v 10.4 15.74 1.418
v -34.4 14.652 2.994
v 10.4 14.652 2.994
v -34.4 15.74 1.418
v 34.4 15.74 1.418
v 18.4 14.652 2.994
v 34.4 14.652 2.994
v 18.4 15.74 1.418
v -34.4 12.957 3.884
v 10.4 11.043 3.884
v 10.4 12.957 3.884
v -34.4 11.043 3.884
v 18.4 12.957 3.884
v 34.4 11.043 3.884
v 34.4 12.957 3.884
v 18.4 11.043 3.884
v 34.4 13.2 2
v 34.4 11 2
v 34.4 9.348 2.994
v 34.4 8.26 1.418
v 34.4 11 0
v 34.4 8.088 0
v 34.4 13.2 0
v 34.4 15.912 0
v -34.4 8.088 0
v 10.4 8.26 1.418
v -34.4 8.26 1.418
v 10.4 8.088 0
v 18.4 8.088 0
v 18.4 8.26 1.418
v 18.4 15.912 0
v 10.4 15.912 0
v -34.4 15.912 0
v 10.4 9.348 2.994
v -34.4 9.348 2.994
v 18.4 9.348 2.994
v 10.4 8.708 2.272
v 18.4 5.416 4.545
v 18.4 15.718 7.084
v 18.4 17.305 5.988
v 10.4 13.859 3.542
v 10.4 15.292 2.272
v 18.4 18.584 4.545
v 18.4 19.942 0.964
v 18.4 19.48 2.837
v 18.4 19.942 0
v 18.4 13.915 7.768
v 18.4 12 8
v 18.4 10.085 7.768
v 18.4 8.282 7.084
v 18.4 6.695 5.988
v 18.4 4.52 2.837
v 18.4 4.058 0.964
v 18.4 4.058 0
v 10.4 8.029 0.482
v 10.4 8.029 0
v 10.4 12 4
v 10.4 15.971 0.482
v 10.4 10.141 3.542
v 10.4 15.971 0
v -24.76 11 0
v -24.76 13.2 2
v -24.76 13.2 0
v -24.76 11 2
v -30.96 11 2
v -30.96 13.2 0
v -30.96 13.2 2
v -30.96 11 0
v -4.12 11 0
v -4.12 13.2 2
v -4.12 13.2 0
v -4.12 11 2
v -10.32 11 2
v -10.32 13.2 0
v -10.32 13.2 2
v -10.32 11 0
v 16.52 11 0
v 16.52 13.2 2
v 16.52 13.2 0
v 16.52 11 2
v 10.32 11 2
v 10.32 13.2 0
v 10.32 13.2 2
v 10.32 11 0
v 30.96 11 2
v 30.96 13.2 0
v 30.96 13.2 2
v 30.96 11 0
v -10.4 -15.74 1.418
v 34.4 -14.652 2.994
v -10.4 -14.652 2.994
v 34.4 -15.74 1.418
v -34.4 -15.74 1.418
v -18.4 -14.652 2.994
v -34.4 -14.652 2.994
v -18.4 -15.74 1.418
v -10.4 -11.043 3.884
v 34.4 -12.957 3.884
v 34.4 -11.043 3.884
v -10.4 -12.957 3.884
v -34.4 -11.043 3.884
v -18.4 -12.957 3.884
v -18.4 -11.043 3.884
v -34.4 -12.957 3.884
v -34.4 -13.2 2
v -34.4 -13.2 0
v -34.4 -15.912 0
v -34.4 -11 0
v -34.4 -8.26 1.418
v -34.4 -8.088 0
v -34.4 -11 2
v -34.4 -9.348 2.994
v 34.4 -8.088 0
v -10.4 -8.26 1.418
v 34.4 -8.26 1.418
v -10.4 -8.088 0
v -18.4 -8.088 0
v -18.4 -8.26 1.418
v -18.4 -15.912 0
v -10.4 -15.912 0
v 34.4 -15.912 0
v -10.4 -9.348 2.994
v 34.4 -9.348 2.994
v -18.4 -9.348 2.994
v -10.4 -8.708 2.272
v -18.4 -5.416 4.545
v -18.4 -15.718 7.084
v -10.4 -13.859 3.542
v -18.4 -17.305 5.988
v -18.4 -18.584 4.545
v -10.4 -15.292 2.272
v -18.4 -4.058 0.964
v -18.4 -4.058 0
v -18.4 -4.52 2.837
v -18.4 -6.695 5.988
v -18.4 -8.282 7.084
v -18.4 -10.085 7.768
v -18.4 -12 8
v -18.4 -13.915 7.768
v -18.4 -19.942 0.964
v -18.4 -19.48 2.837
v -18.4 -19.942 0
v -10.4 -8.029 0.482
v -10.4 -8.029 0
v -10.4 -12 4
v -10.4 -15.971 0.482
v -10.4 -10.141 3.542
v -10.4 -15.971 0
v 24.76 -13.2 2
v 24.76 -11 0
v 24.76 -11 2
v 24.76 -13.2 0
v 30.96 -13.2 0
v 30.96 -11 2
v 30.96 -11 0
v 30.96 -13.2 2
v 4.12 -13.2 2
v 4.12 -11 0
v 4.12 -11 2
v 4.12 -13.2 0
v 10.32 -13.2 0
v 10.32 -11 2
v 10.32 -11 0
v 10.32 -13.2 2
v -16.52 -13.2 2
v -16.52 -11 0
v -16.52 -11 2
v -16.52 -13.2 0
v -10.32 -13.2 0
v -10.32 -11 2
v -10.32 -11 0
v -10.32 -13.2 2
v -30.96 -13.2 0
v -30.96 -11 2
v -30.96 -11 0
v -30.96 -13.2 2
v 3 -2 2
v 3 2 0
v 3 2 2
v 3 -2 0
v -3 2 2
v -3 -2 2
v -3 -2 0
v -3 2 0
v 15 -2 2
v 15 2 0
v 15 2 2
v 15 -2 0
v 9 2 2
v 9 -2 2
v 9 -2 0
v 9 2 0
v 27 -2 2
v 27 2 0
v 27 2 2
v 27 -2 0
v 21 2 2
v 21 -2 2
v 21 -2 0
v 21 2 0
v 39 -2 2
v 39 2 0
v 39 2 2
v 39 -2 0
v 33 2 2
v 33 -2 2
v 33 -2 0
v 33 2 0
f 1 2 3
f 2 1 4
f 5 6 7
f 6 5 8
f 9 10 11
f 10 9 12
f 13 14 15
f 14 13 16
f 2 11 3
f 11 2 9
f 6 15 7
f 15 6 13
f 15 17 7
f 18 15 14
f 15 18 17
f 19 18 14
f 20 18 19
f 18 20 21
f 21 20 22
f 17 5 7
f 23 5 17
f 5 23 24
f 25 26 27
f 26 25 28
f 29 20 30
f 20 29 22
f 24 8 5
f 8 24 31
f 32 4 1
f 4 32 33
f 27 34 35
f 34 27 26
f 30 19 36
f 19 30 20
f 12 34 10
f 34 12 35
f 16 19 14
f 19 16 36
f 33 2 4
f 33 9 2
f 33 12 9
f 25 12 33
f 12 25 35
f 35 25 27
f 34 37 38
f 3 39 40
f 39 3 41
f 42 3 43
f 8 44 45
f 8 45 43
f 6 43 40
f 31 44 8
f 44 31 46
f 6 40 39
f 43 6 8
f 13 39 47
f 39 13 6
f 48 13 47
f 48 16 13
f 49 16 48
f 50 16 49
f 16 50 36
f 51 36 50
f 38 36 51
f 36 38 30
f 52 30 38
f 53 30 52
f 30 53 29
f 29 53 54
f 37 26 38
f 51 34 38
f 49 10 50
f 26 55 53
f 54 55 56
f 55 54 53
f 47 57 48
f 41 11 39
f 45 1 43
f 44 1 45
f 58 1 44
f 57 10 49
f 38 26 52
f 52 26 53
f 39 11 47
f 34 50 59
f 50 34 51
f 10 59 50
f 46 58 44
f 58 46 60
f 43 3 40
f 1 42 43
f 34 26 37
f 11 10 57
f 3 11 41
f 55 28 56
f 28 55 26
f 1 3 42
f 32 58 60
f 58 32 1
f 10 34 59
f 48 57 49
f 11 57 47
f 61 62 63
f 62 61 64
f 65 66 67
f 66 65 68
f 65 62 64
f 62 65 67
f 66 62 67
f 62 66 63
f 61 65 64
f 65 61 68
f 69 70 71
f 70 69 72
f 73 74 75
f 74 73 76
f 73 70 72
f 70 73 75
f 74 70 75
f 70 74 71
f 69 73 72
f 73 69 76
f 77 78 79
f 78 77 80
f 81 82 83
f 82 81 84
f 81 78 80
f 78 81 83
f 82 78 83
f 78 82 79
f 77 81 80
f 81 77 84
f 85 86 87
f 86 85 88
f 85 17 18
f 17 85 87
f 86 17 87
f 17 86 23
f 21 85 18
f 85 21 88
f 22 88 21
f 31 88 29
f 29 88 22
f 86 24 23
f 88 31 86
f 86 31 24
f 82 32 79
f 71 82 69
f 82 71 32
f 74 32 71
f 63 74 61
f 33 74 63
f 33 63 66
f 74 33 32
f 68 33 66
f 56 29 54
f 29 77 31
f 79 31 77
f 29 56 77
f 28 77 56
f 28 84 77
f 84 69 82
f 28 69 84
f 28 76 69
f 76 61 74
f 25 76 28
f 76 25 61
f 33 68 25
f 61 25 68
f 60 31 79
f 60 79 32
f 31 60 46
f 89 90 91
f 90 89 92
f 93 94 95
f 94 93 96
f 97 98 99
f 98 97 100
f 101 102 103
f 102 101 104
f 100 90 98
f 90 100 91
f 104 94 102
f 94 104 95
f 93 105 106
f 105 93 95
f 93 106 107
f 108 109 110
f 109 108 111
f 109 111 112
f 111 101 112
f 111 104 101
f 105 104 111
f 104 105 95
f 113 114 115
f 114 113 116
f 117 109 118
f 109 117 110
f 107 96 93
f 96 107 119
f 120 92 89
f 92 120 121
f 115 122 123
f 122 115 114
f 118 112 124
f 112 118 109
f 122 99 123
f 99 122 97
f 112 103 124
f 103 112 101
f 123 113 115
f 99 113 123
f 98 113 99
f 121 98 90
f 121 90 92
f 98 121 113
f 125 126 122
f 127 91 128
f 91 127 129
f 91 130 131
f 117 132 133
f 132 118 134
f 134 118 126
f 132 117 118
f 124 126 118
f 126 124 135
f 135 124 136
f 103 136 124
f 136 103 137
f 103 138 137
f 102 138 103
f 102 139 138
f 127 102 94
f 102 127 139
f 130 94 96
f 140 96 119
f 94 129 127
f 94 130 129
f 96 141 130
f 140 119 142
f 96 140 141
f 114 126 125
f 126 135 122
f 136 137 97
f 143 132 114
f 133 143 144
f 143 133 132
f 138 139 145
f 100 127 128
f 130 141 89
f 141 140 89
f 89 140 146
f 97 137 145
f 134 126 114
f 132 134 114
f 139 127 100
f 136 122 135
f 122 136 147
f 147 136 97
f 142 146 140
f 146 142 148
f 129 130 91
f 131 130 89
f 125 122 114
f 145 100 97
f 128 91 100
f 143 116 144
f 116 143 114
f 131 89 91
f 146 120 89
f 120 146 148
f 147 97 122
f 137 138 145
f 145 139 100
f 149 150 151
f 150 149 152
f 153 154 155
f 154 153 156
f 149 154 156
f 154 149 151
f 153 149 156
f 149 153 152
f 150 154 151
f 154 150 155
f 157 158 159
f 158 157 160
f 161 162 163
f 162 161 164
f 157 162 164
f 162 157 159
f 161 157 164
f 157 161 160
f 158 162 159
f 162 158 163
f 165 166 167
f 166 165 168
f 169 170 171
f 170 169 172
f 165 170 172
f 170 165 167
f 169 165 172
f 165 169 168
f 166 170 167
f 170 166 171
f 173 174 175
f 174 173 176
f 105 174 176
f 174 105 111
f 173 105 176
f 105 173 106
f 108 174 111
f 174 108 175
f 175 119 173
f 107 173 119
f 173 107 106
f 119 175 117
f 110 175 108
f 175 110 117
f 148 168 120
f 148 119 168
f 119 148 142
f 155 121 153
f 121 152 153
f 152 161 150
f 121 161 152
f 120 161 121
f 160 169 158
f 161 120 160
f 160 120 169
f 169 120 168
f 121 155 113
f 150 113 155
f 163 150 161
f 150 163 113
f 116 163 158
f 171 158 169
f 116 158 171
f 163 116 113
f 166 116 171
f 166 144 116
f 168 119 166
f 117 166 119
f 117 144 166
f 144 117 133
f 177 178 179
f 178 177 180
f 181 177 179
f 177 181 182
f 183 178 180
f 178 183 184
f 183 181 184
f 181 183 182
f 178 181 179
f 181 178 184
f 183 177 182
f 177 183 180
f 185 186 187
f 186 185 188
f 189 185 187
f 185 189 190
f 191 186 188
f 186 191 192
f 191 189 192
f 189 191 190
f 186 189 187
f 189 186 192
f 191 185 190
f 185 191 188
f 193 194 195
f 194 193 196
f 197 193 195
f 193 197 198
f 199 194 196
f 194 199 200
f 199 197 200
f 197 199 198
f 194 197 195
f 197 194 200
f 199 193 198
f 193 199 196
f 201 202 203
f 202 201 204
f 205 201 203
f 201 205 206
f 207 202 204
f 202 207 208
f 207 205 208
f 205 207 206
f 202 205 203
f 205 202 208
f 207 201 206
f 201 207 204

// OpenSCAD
// file: config.scad
// ----------------------------------------------------------------------------
// Configuration of the carousel and its components.
//
// All the values beyod "---- derived" string in each of the sections should
// not be modified manually, as they are derived from the previously defined
// parameters in some way...
// ----------------------------------------------------------------------------

// Generic parameters to address consistency & interconnections of parts.
CYL_FN = 32; // BEWARE!!! set to +- 256 for STL export!
BLEED = 0.5; // overlap for union & difference operations
EASE = 0.2; // socket/pin ease for interconnecting of parts & holes

// Core defining shape of our carousel is N-faced cylinder.
// This affects most of the subsequent parameter definitions & usage.
CAROUSEL_FACE_COUNT = 6;
CAROUSEL_ESCRIBED_RADIUS = 120;
// ---- derived
CAROUSEL_INSCRIBED_RADIUS = CAROUSEL_ESCRIBED_RADIUS * cos(180/CAROUSEL_FACE_COUNT);

// Base of the carousel -> stand that holds the axle, walls, etc.
BASE_TOTAL_HEIGHT = 24;
BASE_FLOOR_THICKNESS = 4;
BASE_WALL_THICKNESS = 4;

// Face, or, a wall of the carousel "shell".
FACE_HEIGHT = 150;
FACE_THICKNESS = 5;
// ---- derived
FACE_WIDTH = CAROUSEL_ESCRIBED_RADIUS * 2 * sin(180/CAROUSEL_FACE_COUNT);
FACE_ANGLE = (1 - 2/CAROUSEL_FACE_COUNT)*180;
FACE_APOTHEM_LEN = FACE_WIDTH / (2 * tan(180/CAROUSEL_FACE_COUNT));
FACE_DOOR_HEIGHT = 0.66 * FACE_HEIGHT;
FACE_DOOR_WIDTH = 0.75 * FACE_WIDTH;

// Roof of the carousel.
ROOF_THICKNESS = 1;
ROOF_HEIGHT = 0.3 * FACE_HEIGHT;

// Ball bearing - real-life dimensions of ball bearing used to "power" the axle.
BEARING_OUTER_D = 22;
BEARING_INNER_D = 8;
BEARING_HEIGHT = 7;
BEARING_SHELL_THICKNESS = 2;

// Axle rotating inside carousel.
AXLE_RADIUS = 4;

// Rotating rig carrying the seats.
RIG_HEIGHT = 6;
RIG_STR = 6;

// Abstract "rings" carrying seats, and their distance off the carousel center
// as a fraction of radius.
RIG_RING_POSITIONS = [0.3, 0.6, 0.9];
RIG_MAX_R = 0.90 * CAROUSEL_INSCRIBED_RADIUS;

COLOR_WALL = "BurlyWood";
COLOR_STRUTS = "SaddleBrown";
COLOR_BASE = "DarkGray";
COLOR_ROOF = "DarkSeaGreen";
COLOR_AXLE = "SaddleBrown";
// main file
include <config.scad>;

arm_height = 2 * AXLE_RADIUS;
axle_height = ROOF_HEIGHT + BASE_TOTAL_HEIGHT - EASE;

module carousel_axle_arms() {
    arm_length = 8 * AXLE_RADIUS;
    arm_width = AXLE_RADIUS;

    color(COLOR_AXLE) {
        difference() {
            union() {
                cylinder(h = arm_height, r = 2 * AXLE_RADIUS);
                for (i = [0 : CAROUSEL_FACE_COUNT/2]){
                    rotate(2 * i * 360/CAROUSEL_FACE_COUNT, [0, 0, 1])
                    translate([0, -arm_width/2, 0])
                    cube([arm_length, arm_width, arm_height]);
                }
            }
            translate([0, 0, -BLEED/2])
                cylinder(h = arm_height + BLEED, r = AXLE_RADIUS + EASE);
        }
    }
}

module carousel_axle() {
    color(COLOR_AXLE) {
        cylinder(h = axle_height, r = AXLE_RADIUS);
        translate([0, 0, axle_height - 3 * arm_height])
            cylinder(h = 2 * AXLE_RADIUS, r1 = AXLE_RADIUS, r2 = 2 * AXLE_RADIUS);
    }
}

// just for presentation, for 3D print the separate parts are better...
module carousel_axle_all_in_one() {
    carousel_axle();
    translate([0, 0, axle_height - 2 * arm_height])
    carousel_axle_arms();
}

PEG_SIZE = [0.5 * AXLE_RADIUS, 0.5 * AXLE_RADIUS, 1.5 * AXLE_RADIUS];

module carousel_axle_half() {
    peg_heights = [0.05, 0.35, 0.65, 0.95];

    translate([-axle_height/2, 0, 0])
    rotate([0, 90, 0])
    difference() {
        carousel_axle();
        translate([0, -5 * AXLE_RADIUS, -BLEED/2])
            cube([10 * AXLE_RADIUS, 10 * AXLE_RADIUS, axle_height + BLEED]);
        for (fz = peg_heights) {
            translate([-PEG_SIZE.x, -PEG_SIZE.y/2, fz * axle_height])
                cube([PEG_SIZE.x + EASE, PEG_SIZE.y + EASE, PEG_SIZE.z + EASE]);
        }
    }
}

module carousel_axle_peg() {
    //translate([0, 0, PEG_SIZE.x/2])
    x = PEG_SIZE.z;
    y = PEG_SIZE.y * 2;
    z = PEG_SIZE.x;

    color(COLOR_AXLE)
    cube([x, y, z], center = true);
}

module carousel_axle_bom() {
    dy = 3 * AXLE_RADIUS;

    translate([0, dy, 0])
    carousel_axle_half();

    translate([0, -dy, 0])
    rotate([0, 0, 180])
        carousel_axle_half();

    for (i = [0:3]) {
        translate([2 * i * PEG_SIZE.z, 0, PEG_SIZE.x/2])
        carousel_axle_peg();
    }
}

carousel_axle_bom();
